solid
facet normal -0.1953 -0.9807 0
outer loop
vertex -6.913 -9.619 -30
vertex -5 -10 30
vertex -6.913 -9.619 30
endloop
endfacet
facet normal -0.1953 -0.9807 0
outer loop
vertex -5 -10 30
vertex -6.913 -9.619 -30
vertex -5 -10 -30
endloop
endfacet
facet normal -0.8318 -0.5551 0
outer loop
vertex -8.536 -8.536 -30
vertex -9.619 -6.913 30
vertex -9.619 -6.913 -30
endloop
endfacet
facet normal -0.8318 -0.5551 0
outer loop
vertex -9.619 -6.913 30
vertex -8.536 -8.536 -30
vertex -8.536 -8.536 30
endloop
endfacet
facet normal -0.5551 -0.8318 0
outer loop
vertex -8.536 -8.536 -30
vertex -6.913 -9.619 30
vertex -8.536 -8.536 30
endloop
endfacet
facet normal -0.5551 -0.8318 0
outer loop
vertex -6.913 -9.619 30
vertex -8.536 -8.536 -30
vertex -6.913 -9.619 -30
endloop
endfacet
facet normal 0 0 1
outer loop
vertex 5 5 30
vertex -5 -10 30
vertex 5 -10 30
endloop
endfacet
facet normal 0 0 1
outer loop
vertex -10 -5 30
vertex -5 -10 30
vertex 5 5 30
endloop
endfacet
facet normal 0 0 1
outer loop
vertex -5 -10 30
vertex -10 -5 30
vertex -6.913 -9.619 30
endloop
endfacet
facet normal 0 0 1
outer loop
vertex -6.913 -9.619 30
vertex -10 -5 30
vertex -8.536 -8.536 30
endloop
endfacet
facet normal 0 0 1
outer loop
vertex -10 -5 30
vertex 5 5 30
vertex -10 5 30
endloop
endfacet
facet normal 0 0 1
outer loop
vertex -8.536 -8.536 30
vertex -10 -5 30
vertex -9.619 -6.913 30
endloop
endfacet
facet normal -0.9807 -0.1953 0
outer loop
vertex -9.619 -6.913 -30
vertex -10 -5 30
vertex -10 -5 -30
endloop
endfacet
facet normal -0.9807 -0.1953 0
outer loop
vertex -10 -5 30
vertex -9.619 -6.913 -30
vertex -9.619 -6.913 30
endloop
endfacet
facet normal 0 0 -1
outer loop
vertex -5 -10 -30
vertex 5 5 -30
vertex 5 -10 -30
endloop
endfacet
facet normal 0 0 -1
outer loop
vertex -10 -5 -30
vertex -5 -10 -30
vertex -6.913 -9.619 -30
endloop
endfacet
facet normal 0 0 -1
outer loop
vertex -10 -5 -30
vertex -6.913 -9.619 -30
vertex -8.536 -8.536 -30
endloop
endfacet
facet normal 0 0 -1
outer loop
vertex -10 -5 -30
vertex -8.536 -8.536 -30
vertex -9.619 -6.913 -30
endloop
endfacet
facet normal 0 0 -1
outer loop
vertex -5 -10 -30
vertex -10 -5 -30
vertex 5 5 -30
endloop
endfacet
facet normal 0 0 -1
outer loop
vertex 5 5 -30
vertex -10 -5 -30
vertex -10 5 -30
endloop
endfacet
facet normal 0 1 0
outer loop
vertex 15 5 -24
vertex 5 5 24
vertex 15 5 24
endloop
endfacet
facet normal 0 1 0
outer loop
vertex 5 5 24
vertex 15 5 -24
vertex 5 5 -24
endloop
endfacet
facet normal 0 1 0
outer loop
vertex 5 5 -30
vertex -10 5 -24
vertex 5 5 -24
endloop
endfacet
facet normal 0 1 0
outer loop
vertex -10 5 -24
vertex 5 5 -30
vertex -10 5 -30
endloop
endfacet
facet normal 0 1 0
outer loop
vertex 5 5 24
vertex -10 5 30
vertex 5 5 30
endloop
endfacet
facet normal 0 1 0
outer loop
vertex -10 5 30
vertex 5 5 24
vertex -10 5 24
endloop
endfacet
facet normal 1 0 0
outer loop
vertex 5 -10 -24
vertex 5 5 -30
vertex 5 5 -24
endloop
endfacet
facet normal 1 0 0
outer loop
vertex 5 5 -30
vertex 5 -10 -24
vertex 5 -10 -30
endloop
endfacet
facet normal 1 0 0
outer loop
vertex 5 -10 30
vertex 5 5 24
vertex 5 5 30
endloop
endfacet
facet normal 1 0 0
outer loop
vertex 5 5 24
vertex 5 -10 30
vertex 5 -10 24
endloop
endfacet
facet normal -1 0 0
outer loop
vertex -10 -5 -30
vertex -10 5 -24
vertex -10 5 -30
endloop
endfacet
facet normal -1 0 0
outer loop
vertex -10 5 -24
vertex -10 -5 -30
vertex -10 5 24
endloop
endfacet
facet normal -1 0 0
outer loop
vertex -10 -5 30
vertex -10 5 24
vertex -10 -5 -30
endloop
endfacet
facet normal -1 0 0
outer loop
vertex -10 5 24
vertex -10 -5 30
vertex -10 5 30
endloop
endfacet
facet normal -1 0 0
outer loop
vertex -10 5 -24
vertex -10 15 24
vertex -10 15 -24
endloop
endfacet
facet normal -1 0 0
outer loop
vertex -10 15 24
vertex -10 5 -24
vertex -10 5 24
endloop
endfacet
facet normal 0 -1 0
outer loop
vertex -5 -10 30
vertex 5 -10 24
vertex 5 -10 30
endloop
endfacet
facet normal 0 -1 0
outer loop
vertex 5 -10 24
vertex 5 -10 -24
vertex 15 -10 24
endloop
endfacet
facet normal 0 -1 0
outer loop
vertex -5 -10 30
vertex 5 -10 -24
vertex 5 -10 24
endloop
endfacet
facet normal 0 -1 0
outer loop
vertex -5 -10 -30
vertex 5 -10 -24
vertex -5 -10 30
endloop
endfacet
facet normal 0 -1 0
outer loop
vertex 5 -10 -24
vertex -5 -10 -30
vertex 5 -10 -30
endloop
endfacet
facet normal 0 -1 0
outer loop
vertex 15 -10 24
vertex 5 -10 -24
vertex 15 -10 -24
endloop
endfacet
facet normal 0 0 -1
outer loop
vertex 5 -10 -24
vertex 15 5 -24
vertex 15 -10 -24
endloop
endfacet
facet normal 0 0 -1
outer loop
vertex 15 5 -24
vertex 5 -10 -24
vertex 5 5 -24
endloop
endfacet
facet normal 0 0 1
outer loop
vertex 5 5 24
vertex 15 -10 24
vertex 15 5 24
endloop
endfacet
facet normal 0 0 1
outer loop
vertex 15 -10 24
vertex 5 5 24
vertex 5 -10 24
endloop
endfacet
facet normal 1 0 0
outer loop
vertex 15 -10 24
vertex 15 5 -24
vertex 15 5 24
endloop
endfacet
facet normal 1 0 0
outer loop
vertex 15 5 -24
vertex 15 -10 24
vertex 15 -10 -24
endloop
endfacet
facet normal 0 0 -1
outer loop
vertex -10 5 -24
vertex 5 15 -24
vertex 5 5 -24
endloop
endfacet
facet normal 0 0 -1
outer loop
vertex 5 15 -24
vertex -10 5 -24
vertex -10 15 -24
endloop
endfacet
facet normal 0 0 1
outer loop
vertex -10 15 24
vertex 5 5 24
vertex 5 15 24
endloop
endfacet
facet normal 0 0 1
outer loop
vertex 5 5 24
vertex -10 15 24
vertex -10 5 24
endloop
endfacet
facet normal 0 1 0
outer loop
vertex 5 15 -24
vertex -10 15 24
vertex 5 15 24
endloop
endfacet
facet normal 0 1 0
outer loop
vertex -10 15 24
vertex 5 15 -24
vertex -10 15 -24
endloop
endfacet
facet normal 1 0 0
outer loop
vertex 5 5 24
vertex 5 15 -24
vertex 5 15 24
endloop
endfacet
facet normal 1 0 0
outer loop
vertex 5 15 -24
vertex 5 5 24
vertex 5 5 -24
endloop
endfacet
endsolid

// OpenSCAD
vyska = 60;  //celeho sloupku
prumer_diry = 0; //
zapust = 6; //vyska zapusteni listy 
vzdalenost_der = 10; //roztec upevňovacich der
vzdalenost_od_okraje = 10; //vzdalenost stredu upevnovaci diry od kraje desky
vzdalenost_od_diry = 5; //vzdalenost od stredu upevnovaci diry na druhou stranu
radidus_hrany = 5; //radius zaobleni


DISPLAY_height = 100; 
DISPLAY_width = 120; 
DISPLAY_depth = 5; 

FP_width = 234;
FP_height = 125;
thickness = 2;
clearance = 0.75;

union () {
color("green")
    translate([-(vzdalenost_od_okraje-radidus_hrany),-(vzdalenost_od_okraje-radidus_hrany),0])  // center top screw
        cylinder(vyska, d=(2*radidus_hrany), center=true);

color("cyan")
    translate([vzdalenost_der/4, vzdalenost_der/4, -vyska/2])
        linear_extrude(height = vyska)
            square([vzdalenost_der/2, vzdalenost_der/2], center = true);    

color("gray")
    translate([-vzdalenost_od_okraje/2, vzdalenost_der/4, -vyska/2])
        linear_extrude(height = vyska)
            square([(vzdalenost_od_okraje), vzdalenost_der/2], center = true);  
    
color("gray")
    translate([vzdalenost_der/4, -vzdalenost_od_okraje/2, -vyska/2])
        linear_extrude(height = vyska)
            square([vzdalenost_der/2, vzdalenost_od_okraje], center = true); 
    
color("red")
    translate([-(vzdalenost_od_okraje-radidus_hrany)/2, -vzdalenost_od_okraje/2, -vyska/2])
        linear_extrude(height = vyska)
            square([vzdalenost_od_okraje-radidus_hrany, vzdalenost_od_okraje], center = true); 
   
color("red")
    translate([-vzdalenost_od_okraje/2,-(vzdalenost_od_okraje-radidus_hrany)/2, -vyska/2])
        linear_extrude(height = vyska)
            square([vzdalenost_od_okraje, vzdalenost_od_okraje-radidus_hrany], center = true); 

color("green")
    translate([vzdalenost_der, -vzdalenost_od_okraje/2, -(vyska-(2*zapust))/2])
        linear_extrude(height = (vyska-(2*zapust)))
            square([vzdalenost_der, vzdalenost_od_okraje], center = true); 
            
color("red")
    translate([-vzdalenost_od_okraje/2,vzdalenost_der, -(vyska-(2*zapust))/2])
        linear_extrude(height = (vyska-(2*zapust)))
            square([ vzdalenost_od_okraje,vzdalenost_der], center = true);             
  
 color("cyan")
    translate([vzdalenost_od_diry/2, vzdalenost_der, -(vyska-(2*zapust))/2])
        linear_extrude(height = (vyska-(2*zapust)))
            square([(vzdalenost_od_diry), vzdalenost_der], center = true);  
  
 color("cyan")
    translate([vzdalenost_der, vzdalenost_od_diry/2, -(vyska-(2*zapust))/2])
        linear_extrude(height = (vyska-(2*zapust)))
            square([vzdalenost_der, vzdalenost_od_diry ], center = true);  
  
}
